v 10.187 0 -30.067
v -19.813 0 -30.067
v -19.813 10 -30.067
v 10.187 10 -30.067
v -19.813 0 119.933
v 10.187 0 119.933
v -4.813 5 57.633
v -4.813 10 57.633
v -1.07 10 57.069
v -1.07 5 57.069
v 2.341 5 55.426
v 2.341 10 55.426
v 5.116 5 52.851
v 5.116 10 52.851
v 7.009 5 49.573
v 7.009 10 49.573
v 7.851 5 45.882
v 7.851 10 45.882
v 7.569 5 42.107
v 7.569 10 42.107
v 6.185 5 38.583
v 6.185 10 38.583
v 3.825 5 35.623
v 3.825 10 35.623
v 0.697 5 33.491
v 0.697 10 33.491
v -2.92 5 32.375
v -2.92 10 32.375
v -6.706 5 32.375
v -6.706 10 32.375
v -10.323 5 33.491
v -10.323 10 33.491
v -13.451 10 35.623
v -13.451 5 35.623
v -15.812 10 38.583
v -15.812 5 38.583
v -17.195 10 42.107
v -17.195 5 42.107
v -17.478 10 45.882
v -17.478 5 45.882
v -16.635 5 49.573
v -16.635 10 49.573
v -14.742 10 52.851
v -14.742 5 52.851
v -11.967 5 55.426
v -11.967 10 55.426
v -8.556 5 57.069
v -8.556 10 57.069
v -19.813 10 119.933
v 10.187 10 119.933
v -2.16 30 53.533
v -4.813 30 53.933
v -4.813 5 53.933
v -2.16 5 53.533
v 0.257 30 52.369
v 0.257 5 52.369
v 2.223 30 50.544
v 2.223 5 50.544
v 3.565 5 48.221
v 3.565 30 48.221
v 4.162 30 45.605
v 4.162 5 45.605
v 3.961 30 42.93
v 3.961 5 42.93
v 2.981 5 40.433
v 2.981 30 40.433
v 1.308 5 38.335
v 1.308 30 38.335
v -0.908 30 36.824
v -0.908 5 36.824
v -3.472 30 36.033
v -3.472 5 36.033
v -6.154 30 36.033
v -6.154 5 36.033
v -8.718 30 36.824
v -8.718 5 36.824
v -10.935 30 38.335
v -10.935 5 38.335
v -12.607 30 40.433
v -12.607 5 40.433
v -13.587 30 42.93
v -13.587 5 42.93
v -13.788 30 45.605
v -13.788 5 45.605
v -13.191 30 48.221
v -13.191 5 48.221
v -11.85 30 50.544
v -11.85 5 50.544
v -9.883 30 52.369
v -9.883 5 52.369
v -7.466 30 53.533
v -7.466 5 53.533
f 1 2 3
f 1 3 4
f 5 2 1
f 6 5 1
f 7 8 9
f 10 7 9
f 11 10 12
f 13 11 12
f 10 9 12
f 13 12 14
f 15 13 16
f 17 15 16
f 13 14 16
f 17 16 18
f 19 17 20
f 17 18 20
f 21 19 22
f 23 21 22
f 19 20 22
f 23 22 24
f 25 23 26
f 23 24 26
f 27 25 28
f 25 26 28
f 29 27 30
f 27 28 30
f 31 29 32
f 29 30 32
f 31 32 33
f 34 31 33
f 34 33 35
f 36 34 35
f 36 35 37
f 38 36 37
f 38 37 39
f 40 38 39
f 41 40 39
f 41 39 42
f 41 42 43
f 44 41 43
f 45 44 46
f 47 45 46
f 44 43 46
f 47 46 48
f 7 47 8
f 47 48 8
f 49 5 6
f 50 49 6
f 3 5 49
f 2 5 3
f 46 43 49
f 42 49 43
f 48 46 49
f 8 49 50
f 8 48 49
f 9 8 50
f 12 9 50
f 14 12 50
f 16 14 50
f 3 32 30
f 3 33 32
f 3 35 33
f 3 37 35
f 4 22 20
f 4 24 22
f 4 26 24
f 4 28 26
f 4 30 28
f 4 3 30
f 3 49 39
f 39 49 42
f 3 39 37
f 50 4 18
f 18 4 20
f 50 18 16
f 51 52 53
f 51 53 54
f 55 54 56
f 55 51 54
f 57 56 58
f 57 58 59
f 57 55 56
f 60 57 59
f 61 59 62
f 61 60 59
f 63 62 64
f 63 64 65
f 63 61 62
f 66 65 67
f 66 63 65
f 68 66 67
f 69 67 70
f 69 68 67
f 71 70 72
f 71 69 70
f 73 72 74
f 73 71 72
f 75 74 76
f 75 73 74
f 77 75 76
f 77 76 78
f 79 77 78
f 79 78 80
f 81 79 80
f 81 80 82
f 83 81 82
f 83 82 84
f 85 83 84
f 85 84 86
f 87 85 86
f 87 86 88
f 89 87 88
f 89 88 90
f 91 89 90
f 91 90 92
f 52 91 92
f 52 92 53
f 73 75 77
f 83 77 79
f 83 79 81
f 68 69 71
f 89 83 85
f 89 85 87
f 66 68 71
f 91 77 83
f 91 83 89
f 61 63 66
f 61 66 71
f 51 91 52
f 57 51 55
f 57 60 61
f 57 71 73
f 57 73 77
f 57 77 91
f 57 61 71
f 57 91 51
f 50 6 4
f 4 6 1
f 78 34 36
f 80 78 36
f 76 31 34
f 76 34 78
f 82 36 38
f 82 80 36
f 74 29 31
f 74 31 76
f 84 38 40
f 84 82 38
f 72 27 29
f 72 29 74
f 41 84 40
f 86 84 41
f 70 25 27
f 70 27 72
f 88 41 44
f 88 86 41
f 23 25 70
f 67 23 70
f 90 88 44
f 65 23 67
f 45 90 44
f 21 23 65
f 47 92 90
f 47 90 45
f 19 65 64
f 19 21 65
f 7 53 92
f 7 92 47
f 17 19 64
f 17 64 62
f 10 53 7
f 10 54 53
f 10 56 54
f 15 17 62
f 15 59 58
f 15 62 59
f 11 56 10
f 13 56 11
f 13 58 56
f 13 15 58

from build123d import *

# Parameters (mm, degrees)
SKETCH1_W           = 30
SKETCH1_H           = 150
BOSS_EXTRUDE2_DEPTH = 10
SKETCH3_R           = 12.7
SKETCH3_R_2         = 9
CUT_EXTRUDE1_DEPTH  = 5
BOSS_EXTRUDE3_START = 20
SKETCH4_R           = 9
BOSS_EXTRUDE3_DEPTH = 20


with BuildPart() as part:
    # Sketch1 → Boss-Extrude2 (new body)
    with BuildSketch(Plane(origin=(0, 0, 0), x_dir=(1, 0, 0), z_dir=(0, 1, 0))):
        with Locations((-4.813074205, -44.932862191)):
            Rectangle(SKETCH1_W, SKETCH1_H)
    extrude(amount=BOSS_EXTRUDE2_DEPTH)

    # Sketch3 → Cut-Extrude1 (cut)
    with BuildSketch(Plane(origin=(0, 10, 0), x_dir=(1, 0, 0), z_dir=(0, 1, 0))):
        with Locations(Location((-4.813074205, -44.932862191, 0), (0, 0, 270))):
            Circle(SKETCH3_R)
        with Locations(Location((-4.813074205, -44.932862191, 0), (0, 0, 270))):
            Circle(SKETCH3_R_2, mode=Mode.SUBTRACT)
    extrude(amount=-CUT_EXTRUDE1_DEPTH, mode=Mode.SUBTRACT)

    # Sketch4 → Boss-Extrude3 (add)
    with BuildSketch(Plane(origin=(0, 10, 0), x_dir=(1, 0, 0), z_dir=(0, 1, 0)).offset(BOSS_EXTRUDE3_START)):
        with Locations(Location((-4.813074205, -44.932862191, 0), (0, 0, 270))):
            Circle(SKETCH4_R)
    extrude(amount=-BOSS_EXTRUDE3_DEPTH)


solid = part.part
